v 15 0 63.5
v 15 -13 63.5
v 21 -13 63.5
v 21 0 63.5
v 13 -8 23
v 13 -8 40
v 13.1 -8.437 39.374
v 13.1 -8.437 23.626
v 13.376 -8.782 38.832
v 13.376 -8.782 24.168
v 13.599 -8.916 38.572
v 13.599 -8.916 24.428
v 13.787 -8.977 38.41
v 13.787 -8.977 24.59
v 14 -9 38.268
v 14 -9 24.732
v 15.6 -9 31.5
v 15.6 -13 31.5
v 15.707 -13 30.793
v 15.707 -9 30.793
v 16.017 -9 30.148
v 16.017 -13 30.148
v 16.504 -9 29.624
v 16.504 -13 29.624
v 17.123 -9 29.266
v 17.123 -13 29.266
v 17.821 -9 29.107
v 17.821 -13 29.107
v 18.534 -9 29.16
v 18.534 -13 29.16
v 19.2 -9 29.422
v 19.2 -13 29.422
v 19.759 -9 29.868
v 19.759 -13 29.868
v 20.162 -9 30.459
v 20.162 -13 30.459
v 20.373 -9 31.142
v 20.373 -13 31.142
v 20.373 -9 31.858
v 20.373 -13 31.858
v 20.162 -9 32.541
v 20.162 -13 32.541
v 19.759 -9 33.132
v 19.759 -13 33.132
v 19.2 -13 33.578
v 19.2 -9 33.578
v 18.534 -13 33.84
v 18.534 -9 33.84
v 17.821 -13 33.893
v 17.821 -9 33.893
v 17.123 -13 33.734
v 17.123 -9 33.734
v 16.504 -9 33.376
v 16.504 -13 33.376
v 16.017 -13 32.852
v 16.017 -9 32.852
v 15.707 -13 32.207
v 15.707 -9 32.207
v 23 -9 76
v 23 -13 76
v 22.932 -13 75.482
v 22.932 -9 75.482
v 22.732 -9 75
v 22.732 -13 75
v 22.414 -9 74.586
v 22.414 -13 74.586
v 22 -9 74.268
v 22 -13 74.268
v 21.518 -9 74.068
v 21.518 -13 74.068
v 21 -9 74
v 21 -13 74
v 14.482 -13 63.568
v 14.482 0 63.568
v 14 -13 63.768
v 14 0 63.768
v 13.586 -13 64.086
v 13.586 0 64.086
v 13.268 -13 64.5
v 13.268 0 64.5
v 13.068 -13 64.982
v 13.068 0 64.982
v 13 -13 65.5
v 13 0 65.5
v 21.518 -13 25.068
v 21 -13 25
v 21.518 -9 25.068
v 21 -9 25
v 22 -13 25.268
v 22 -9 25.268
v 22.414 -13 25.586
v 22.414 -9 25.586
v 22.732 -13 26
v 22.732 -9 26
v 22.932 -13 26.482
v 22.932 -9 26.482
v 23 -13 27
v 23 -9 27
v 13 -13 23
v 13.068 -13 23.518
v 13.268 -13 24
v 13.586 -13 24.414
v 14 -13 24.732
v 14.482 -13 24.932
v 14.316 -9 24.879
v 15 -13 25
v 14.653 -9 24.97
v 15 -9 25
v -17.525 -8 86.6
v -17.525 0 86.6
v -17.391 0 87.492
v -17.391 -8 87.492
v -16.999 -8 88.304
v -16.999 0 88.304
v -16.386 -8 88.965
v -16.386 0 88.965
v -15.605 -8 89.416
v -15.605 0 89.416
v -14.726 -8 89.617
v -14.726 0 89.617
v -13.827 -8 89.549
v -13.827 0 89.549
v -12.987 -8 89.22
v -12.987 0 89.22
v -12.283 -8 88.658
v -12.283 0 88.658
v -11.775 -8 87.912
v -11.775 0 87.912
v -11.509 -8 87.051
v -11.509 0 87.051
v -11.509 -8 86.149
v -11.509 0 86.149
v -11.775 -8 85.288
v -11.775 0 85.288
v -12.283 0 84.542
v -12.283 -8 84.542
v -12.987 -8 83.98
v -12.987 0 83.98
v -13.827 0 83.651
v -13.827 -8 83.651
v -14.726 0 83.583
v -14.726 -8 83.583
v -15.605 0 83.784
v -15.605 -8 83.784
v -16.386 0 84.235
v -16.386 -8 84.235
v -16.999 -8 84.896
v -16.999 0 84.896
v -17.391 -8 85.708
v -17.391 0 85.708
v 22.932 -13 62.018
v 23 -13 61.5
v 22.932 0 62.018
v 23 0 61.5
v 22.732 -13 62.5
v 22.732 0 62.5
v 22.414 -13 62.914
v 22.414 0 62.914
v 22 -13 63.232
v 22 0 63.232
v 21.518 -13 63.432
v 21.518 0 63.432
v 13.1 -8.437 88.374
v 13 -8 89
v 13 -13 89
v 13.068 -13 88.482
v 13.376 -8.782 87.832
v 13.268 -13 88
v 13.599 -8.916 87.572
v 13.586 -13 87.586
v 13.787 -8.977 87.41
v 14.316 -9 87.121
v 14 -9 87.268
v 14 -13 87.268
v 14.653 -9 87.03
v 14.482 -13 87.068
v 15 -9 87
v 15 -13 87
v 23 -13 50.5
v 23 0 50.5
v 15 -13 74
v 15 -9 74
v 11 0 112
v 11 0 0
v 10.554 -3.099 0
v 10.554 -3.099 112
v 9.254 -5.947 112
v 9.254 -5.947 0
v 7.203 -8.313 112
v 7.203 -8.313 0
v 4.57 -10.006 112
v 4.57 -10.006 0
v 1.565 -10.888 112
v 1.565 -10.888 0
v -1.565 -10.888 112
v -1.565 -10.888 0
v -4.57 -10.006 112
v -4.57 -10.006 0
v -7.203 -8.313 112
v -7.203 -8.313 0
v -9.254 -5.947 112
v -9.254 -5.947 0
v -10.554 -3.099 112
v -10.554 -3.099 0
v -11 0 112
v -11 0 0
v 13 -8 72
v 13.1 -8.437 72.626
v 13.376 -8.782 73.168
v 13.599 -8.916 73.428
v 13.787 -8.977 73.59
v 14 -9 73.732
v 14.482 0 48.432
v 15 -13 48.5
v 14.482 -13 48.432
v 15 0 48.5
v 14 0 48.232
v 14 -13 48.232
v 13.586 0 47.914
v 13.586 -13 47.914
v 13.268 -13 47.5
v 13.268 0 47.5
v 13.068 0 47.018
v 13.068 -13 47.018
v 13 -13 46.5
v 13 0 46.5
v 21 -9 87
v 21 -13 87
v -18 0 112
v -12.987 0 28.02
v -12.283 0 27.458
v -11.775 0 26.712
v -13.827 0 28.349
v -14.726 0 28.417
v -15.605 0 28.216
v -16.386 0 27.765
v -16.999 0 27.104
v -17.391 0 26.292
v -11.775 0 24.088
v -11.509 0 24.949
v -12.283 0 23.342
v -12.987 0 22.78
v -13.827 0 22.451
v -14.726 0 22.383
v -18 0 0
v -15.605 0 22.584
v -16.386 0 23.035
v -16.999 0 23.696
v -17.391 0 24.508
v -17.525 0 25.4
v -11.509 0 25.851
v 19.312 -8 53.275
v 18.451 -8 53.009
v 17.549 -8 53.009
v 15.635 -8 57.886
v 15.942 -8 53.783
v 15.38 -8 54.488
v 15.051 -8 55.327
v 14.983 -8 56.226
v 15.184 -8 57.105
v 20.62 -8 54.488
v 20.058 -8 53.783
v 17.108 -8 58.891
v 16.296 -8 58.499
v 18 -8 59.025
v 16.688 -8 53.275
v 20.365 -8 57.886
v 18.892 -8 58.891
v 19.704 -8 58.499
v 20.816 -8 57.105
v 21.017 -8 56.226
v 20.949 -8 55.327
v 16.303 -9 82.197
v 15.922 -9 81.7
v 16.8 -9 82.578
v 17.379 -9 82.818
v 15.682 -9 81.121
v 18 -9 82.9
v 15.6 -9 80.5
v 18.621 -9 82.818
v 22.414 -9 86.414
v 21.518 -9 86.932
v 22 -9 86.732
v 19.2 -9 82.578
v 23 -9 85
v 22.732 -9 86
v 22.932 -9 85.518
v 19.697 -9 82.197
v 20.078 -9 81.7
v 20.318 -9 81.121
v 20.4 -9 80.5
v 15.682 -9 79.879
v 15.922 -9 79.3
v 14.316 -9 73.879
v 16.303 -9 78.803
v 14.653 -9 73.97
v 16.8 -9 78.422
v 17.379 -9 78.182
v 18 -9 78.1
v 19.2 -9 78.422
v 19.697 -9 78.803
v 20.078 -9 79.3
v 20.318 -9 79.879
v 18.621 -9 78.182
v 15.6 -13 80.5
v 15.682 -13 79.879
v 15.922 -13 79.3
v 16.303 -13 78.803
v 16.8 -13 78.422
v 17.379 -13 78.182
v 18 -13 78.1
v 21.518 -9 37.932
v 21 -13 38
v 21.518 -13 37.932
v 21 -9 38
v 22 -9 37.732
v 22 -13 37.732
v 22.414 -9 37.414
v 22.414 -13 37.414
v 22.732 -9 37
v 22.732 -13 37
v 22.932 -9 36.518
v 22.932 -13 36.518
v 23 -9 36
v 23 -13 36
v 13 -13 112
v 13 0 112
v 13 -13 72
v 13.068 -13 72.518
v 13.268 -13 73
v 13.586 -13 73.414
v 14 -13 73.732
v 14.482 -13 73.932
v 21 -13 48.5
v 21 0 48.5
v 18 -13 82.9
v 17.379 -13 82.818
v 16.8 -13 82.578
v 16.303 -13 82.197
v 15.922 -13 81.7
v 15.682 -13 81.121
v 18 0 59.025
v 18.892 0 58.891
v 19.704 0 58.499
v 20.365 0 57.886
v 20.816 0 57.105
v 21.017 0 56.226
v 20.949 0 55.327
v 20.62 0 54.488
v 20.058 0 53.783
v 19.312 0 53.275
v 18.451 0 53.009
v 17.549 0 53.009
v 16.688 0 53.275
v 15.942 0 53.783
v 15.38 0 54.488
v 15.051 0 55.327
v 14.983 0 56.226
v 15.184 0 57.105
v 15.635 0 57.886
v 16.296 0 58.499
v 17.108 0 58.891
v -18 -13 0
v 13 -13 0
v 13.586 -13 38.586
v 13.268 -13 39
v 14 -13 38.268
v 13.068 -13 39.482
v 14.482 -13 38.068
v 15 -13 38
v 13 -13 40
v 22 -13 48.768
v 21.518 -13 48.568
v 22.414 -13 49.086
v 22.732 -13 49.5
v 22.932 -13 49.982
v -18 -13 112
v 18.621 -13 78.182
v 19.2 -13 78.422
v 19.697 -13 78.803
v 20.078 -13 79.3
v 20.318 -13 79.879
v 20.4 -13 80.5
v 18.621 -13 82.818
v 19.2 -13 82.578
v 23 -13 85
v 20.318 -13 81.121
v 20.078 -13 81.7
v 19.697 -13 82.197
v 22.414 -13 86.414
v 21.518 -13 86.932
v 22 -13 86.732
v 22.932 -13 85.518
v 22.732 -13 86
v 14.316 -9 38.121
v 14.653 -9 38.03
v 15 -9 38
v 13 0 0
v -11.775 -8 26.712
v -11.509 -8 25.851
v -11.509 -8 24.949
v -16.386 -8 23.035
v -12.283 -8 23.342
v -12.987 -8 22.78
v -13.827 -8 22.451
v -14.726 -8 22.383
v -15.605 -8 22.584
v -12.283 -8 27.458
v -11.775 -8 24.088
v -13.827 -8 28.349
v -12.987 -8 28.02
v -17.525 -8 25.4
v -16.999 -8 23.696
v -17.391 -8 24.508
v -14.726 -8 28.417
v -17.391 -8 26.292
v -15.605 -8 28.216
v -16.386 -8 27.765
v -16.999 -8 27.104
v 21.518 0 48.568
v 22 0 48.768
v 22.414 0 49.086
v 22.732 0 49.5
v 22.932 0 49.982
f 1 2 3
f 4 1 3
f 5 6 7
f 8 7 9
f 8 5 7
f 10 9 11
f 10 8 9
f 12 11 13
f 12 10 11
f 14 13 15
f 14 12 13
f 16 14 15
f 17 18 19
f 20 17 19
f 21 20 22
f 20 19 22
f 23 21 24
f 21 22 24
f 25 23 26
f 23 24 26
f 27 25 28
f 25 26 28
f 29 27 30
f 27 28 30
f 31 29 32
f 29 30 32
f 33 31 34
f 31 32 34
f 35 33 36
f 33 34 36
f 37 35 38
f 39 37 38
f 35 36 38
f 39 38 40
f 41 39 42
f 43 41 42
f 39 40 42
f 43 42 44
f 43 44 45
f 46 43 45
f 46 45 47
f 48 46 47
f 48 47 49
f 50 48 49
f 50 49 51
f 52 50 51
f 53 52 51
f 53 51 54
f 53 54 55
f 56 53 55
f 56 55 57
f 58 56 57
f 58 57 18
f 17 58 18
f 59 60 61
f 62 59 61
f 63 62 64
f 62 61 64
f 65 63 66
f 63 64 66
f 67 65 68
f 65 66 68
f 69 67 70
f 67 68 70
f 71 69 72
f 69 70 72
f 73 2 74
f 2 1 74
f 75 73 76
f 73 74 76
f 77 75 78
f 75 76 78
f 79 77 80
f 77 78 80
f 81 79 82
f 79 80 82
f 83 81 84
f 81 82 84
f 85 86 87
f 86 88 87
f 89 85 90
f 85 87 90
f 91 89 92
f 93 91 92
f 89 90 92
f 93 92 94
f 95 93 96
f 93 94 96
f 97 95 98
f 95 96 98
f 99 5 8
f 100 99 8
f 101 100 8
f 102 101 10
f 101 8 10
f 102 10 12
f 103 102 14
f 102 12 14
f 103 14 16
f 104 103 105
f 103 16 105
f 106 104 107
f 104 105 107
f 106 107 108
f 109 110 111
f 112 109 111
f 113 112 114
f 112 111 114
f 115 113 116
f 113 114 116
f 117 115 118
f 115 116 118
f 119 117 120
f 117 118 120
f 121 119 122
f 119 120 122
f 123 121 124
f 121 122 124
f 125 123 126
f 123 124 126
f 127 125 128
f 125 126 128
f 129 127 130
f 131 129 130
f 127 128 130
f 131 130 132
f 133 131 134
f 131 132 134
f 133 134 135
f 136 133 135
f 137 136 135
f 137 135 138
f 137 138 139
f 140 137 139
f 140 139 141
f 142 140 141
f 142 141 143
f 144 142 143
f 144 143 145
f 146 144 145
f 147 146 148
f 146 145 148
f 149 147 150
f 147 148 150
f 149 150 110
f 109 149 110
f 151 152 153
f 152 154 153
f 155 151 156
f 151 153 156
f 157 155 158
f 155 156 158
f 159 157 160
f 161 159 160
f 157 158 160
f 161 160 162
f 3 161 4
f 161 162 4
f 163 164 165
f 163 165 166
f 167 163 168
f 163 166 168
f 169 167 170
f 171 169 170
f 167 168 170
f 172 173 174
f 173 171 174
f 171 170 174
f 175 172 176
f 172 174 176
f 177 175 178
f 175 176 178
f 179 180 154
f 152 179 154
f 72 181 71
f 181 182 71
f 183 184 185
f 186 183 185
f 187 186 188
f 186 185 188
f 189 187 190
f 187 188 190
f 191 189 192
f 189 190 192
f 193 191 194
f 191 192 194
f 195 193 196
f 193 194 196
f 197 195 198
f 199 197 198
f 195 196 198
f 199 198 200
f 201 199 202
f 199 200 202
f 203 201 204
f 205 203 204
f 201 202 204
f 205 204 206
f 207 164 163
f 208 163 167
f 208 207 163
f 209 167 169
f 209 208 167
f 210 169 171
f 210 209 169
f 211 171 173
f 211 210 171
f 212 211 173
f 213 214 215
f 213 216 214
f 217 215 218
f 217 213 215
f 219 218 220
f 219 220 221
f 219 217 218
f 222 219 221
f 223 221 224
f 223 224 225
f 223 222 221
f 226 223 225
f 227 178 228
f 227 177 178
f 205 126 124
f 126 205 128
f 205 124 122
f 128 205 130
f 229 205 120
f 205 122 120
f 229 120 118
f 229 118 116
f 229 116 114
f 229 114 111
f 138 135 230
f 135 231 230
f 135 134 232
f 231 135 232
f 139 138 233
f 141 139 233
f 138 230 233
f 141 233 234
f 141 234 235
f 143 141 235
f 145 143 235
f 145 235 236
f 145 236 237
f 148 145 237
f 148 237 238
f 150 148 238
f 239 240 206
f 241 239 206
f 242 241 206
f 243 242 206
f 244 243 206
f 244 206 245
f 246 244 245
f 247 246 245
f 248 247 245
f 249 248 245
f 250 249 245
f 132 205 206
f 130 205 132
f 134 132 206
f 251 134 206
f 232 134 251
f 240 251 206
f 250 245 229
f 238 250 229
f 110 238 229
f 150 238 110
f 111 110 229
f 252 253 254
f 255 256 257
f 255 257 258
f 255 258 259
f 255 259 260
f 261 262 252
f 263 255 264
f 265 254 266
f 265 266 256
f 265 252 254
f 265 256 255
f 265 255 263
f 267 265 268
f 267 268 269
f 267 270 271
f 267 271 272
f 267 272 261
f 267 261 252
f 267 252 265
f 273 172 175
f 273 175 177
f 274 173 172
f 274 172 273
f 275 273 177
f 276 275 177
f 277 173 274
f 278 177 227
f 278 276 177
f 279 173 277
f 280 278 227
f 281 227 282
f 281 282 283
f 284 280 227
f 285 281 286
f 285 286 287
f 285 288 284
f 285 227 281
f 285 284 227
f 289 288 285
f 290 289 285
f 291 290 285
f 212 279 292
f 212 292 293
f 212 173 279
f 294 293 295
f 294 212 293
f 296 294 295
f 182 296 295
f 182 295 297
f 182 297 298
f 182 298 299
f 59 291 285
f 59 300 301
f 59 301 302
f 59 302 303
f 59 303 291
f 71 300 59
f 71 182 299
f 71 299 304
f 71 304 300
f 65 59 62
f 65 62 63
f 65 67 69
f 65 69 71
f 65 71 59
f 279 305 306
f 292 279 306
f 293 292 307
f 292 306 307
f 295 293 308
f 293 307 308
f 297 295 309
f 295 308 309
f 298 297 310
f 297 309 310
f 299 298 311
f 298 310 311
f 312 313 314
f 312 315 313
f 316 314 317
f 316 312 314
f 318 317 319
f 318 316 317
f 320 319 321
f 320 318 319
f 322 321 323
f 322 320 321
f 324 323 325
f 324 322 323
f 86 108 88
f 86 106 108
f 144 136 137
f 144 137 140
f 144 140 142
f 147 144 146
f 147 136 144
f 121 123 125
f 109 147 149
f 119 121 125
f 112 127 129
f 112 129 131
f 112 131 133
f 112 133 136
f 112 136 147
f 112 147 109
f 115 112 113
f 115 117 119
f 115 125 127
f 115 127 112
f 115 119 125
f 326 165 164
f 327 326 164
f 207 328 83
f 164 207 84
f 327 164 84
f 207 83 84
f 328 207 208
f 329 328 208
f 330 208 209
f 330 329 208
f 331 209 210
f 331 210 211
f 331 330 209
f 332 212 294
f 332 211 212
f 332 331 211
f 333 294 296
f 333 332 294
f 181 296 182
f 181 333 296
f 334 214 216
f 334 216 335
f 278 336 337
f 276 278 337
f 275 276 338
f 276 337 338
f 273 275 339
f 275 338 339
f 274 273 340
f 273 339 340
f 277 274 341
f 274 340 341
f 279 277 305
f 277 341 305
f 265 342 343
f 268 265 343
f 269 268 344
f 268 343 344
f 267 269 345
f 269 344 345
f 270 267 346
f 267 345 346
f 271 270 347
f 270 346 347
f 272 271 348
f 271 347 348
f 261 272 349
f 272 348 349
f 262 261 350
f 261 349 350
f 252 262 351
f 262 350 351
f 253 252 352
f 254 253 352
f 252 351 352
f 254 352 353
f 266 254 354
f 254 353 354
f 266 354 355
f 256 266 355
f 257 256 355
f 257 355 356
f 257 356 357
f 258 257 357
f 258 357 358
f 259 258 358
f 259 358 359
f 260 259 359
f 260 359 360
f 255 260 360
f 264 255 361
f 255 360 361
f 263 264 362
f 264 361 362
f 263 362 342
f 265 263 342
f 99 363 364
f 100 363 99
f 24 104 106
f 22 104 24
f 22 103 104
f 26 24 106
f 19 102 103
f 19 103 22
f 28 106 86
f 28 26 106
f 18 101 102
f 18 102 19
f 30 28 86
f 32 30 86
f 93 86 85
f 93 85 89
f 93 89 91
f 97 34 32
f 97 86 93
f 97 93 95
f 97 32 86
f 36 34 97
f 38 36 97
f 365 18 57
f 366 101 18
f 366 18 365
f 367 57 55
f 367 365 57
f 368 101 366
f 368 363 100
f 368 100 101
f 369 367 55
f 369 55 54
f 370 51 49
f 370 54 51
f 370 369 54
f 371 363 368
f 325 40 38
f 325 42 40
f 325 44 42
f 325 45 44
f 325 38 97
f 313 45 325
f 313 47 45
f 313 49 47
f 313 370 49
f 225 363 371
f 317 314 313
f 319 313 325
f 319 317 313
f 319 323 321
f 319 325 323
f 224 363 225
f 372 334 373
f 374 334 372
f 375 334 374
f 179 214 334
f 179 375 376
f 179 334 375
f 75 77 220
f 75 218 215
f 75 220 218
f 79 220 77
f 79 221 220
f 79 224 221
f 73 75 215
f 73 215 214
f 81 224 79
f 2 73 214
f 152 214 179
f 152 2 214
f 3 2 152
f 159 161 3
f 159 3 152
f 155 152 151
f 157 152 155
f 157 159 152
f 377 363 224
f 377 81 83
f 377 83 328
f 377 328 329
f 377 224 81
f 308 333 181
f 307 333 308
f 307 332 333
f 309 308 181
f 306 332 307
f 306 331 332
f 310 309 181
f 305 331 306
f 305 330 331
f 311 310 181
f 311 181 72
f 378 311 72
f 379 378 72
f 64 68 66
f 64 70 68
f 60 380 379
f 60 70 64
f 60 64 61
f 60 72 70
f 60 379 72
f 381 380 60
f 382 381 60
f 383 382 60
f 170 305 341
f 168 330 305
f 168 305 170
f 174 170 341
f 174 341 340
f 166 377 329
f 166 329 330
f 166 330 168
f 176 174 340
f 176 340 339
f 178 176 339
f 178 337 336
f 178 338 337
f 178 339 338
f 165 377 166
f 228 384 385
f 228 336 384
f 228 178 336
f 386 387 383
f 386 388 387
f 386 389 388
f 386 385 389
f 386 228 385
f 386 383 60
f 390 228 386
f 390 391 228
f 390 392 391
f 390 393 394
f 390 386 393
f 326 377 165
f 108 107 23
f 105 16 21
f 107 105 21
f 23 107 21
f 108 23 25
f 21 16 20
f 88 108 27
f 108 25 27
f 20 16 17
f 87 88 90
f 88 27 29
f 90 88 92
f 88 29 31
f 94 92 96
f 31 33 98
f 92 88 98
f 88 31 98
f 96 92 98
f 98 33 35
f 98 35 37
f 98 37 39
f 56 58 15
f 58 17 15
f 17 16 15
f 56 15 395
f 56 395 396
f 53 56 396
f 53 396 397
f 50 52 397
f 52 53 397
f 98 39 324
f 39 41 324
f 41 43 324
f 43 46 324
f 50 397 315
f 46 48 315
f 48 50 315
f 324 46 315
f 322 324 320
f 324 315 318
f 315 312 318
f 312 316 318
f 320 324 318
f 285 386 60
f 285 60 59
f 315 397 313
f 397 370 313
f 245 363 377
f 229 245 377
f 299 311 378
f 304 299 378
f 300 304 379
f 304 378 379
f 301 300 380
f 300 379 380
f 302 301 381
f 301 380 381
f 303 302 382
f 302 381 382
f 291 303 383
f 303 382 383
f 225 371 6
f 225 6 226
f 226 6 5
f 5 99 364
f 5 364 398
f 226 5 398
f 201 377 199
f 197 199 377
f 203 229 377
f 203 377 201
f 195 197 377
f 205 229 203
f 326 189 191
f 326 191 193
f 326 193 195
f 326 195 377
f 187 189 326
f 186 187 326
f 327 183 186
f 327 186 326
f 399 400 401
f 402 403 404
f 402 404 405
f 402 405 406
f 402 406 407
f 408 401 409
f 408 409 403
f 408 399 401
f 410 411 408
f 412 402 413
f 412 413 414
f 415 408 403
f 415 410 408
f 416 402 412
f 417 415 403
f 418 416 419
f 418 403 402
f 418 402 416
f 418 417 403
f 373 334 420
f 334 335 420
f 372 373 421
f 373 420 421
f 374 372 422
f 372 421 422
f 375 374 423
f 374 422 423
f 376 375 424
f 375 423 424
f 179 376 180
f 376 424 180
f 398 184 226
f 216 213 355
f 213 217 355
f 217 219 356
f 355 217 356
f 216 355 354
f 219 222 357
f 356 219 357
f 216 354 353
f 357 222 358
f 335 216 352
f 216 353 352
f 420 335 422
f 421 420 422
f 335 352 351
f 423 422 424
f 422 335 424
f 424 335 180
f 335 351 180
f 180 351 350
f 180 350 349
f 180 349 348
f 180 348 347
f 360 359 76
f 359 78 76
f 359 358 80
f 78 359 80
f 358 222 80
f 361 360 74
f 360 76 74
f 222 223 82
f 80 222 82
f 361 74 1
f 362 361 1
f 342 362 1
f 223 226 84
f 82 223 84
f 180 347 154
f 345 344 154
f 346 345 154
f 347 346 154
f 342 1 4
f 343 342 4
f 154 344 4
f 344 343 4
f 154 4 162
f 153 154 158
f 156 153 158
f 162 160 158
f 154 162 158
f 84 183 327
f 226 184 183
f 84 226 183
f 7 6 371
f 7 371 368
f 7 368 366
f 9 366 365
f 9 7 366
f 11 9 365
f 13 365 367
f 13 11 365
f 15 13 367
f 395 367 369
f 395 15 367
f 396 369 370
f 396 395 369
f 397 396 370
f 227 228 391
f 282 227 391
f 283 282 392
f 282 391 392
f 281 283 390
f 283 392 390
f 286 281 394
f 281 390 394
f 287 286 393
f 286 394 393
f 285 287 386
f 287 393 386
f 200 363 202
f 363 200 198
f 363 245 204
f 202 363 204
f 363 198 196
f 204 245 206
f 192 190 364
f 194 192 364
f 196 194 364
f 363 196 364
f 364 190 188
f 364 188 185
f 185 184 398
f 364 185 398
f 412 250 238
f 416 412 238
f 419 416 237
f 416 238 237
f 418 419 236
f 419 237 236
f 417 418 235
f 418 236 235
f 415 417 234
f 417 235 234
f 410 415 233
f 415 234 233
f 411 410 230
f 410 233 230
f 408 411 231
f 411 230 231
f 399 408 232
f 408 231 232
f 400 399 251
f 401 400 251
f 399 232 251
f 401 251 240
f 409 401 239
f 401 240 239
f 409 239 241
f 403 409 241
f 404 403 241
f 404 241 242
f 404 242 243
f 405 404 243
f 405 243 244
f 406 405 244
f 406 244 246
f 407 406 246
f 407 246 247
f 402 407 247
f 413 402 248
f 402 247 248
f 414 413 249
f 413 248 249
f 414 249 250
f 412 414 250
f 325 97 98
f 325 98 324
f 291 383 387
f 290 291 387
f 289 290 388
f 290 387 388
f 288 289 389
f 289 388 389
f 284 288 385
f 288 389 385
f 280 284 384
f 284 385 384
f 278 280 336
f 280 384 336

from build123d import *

# Parameters (mm, degrees)
BOSS_EXTRUDE1_DEPTH  = 112
SKETCH2_R            = 3.025
CUT_EXTRUDE1_DEPTH   = 8
SKETCH3_W            = 11
SKETCH3_H            = 11
BOSS_EXTRUDE2_DEPTH  = 4
BOSS_EXTRUDE3_REACH  = 126.988
SKETCH8_W            = 10
SKETCH8_H            = 13
BOSS_EXTRUDE4_DEPTH  = 4
FILLET1_R            = 2
M4_CLEARANCE_HOLE1_D = 4.8
MIRROR1_START        = 12.831076745
MIRROR1_OUTLINE_W    = 4
MIRROR1_OUTLINE_H    = 13
MIRROR1_DEPTH        = 2.768923155
MIRROR1_START_2      = 20.4000001
MIRROR1_2_OUTLINE_W  = 4
MIRROR1_2_OUTLINE_H  = 13
MIRROR1_2_DEPTH      = 0.5999999
MIRROR1_START_3      = 74
MIRROR1_3_DEPTH      = 13
MIRROR1_4_OUTLINE_W  = 4.8000002
MIRROR1_4_OUTLINE_H  = 4
MIRROR1_4_DEPTH      = 4.0999999
MIRROR1_START_4      = 82.9000001
MIRROR1_5_OUTLINE_W  = 4.8000002
MIRROR1_5_OUTLINE_H  = 4
MIRROR1_5_DEPTH      = 4.0999999
MIRROR1_START_5      = 76
MIRROR1_6_OUTLINE_W  = 2
MIRROR1_6_OUTLINE_H  = 4
MIRROR1_6_DEPTH      = 9
MIRROR1_START_6      = -13
MIRROR1_7_DEPTH      = 4
CUT_EXTRUDE2_DEPTH   = 126.455171276
BOSS_EXTRUDE5_START  = -87
BOSS_EXTRUDE5_DEPTH  = 112
SKETCH15_W           = 10
SKETCH15_H           = 15
SKETCH15_R           = 3.025
BOSS_EXTRUDE6_DEPTH  = 13
SKETCH16_R           = 3.025
CUT_EXTRUDE3_DEPTH   = 8
FILLET2_R            = 2
FILLET3_R            = 1


with BuildPart() as part:
    # Sketch1 → Boss-Extrude1 (new body)
    with BuildSketch(Plane.XY):
        with BuildLine():
            ThreePointArc((0, -13), (-9.192388155, -9.192388155), (-13, 0))
            Line((-13, 0), (-18, 0))
            Line((-18, 0), (-18, -13))
            Line((-18, -13), (0, -13))
        make_face()
        with BuildLine():
            Line((-11, 0), (-13, 0))
            ThreePointArc((-13, 0), (-9.192388155, -9.192388155), (0, -13))
            ThreePointArc((0, -13), (9.192388155, -9.192388155), (13, 0))
            Line((13, 0), (11, 0))
            ThreePointArc((11, 0), (0, -11), (-11, 0))
        make_face()
    extrude(amount=BOSS_EXTRUDE1_DEPTH)

    # Sketch2 → Cut-Extrude1 (cut)
    with BuildSketch(Plane(origin=(0, 0, 0), x_dir=(1, 0, 0), z_dir=(0, 1, 0))):
        with Locations(Location((-14.5, -25.4, 0), (0, 0, 180))):
            Circle(SKETCH2_R)
        with Locations(Location((-14.5, -86.6, 0), (0, 0, 180))):
            Circle(SKETCH2_R)
    extrude(amount=-CUT_EXTRUDE1_DEPTH, mode=Mode.SUBTRACT)

    # Sketch3 → Boss-Extrude2 (add)
    with BuildSketch(Plane.XZ.offset(13)):
        with Locations((-12.5, 117.5)):
            Rectangle(SKETCH3_W, SKETCH3_H)
    extrude(amount=-BOSS_EXTRUDE2_DEPTH)

    # Sketch7 → Boss-Extrude3 (add, up to next)
    with BuildSketch(Plane.XZ.offset(13), mode=Mode.PRIVATE) as boss_extrude3_sk1:
        Polygon((0, 25), (13, 25), (13, 31.5), (13, 38), (0, 38), align=None)
    boss_extrude3_tool1 = extrude(boss_extrude3_sk1.sketch, amount=-BOSS_EXTRUDE3_REACH, mode=Mode.PRIVATE) - part.part
    add(boss_extrude3_tool1.solids().sort_by_distance((6.5, -13, 31.5))[0])

    # Sketch8 → Boss-Extrude4 (add)
    with BuildSketch(Plane.XZ.offset(13)):
        with Locations((18, 31.5)):
            Rectangle(SKETCH8_W, SKETCH8_H)
    extrude(amount=-BOSS_EXTRUDE4_DEPTH)

    # Fillet1
    fillet1_edges = [part.edges().sort_by_distance(p)[0] for p in [
        (-18, -11, 123),
        (-7, -11, 123),
        (23, -11, 38),
        (23, -11, 25),
    ]]
    fillet(fillet1_edges, radius=FILLET1_R)

    # M4 Clearance Hole1 (through all)
    with Locations(Plane(origin=(0, -9, 0), x_dir=(1, 0, 0), z_dir=(0, 1, 0))):
        with Locations((-12.5, -117.5), (18, -31.5)):
            Hole(M4_CLEARANCE_HOLE1_D / 2)



with BuildPart() as body_2:
    # Mirror1: read off the stored shape, not the designer's step
    # Mirror1 outline → Mirror1 (new body)
    with BuildSketch(Plane.YZ.offset(MIRROR1_START)):
        with Locations((-11, 80.5)):
            Rectangle(MIRROR1_OUTLINE_W, MIRROR1_OUTLINE_H)
    extrude(amount=MIRROR1_DEPTH)


with BuildPart() as body_3:
    # Mirror1 2 outline → Mirror1 2 (new body)
    with BuildSketch(Plane.YZ.offset(MIRROR1_START_2)):
        with Locations((-11, 80.5)):
            Rectangle(MIRROR1_2_OUTLINE_W, MIRROR1_2_OUTLINE_H)
    extrude(amount=MIRROR1_2_DEPTH)


with BuildPart() as part_1:
    add(part.part)

    add(body_2.part)  # Mirror1 3 merges body 2
    # Mirror1 3 outline → Mirror1 3 (add)
    with BuildSketch(Plane.XY.offset(MIRROR1_START_3)):
        with BuildLine():
            Line((15.5999999, -9), (13, -9))
            Line((13, -9), (13, 0))
            ThreePointArc((13, 0), (9.192388155, -9.192388155), (0, -13))
            Line((0, -13), (12.831076745, -13))
            Line((12.831076745, -13), (15.5999999, -13))
            Line((15.5999999, -13), (15.5999999, -9))
        make_face()
    extrude(amount=MIRROR1_3_DEPTH)


    add(body_3.part)  # Mirror1 4 merges body 3
    # Mirror1 4 outline → Mirror1 4 (add)
    with BuildSketch(Plane.XY.offset(MIRROR1_START_3)):
        with Locations((18, -11)):
            Rectangle(MIRROR1_4_OUTLINE_W, MIRROR1_4_OUTLINE_H)
    extrude(amount=MIRROR1_4_DEPTH)

    # Mirror1 5 outline → Mirror1 5 (add)
    with BuildSketch(Plane.XY.offset(MIRROR1_START_4)):
        with Locations((18, -11)):
            Rectangle(MIRROR1_5_OUTLINE_W, MIRROR1_5_OUTLINE_H)
    extrude(amount=MIRROR1_5_DEPTH)

    # Mirror1 6 outline → Mirror1 6 (add)
    with BuildSketch(Plane.XY.offset(MIRROR1_START_5)):
        with Locations((22, -11)):
            Rectangle(MIRROR1_6_OUTLINE_W, MIRROR1_6_OUTLINE_H)
    extrude(amount=MIRROR1_6_DEPTH)

    # Mirror1 7 outline → Mirror1 7 (add)
    with BuildSketch(Plane(origin=(0, 0, 0), x_dir=(1, 0, 0), z_dir=(0, 1, 0)).offset(MIRROR1_START_6)):
        with BuildLine():
            ThreePointArc((23, -76), (22.414213562, -74.585786438), (21, -74))
            Line((21, -74), (21, -76))
            Line((21, -76), (23, -76))
        make_face()
        with BuildLine():
            Line((21, -85), (21, -87))
            ThreePointArc((21, -87), (22.414213562, -86.414213562), (23, -85))
            Line((23, -85), (21, -85))
        make_face()
        with BuildLine():
            Line((20.4000001, -82.9000001), (20.4, -80.5))
            ThreePointArc((20.4, -80.5), (19.697056275, -82.197056275), (18, -82.9))
            Line((18, -82.9), (20.4000001, -82.9000001))
        make_face()
        with BuildLine():
            ThreePointArc((18, -78.1), (19.697056275, -78.802943725), (20.4, -80.5))
            Line((20.4, -80.5), (20.4000001, -78.0999999))
            Line((20.4000001, -78.0999999), (18, -78.1))
        make_face()
        with BuildLine():
            ThreePointArc((15.6, -80.5), (16.302943725, -78.802943725), (18, -78.1))
            Line((18, -78.1), (15.5999999, -78.0999999))
            Line((15.5999999, -78.0999999), (15.6, -80.5))
        make_face()
        with BuildLine():
            Line((15.5999999, -82.9000001), (18, -82.9))
            ThreePointArc((18, -82.9), (16.302943725, -82.197056275), (15.6, -80.5))
            Line((15.6, -80.5), (15.5999999, -82.9000001))
        make_face()
    extrude(amount=MIRROR1_7_DEPTH)

    # Sketch12 → Cut-Extrude2 (cut, through all)
    with BuildSketch(Plane(origin=(0, -9, 0), x_dir=(1, 0, 0), z_dir=(0, 1, 0))):
        with BuildLine():
            Line((-18, -112), (-18, -121))
            ThreePointArc((-18, -121), (-17.414213562, -122.414213562), (-16, -123))
            Line((-16, -123), (-9, -123))
            ThreePointArc((-9, -123), (-7.585786438, -122.414213562), (-7, -121))
            Line((-7, -121), (-7, -112))
            Line((-7, -112), (-18, -112))
        make_face()
    extrude(amount=-CUT_EXTRUDE2_DEPTH, mode=Mode.SUBTRACT)

    # Sketch13 → Boss-Extrude5 (add)
    with BuildSketch(Plane.XY.offset(87).offset(BOSS_EXTRUDE5_START)):
        with BuildLine():
            Line((13, -13), (13, -9))
            Line((13, -9), (13, 0))
            ThreePointArc((13, 0), (9.192388155, -9.192388155), (0, -13))
            Line((0, -13), (13, -13))
        make_face()
    extrude(amount=BOSS_EXTRUDE5_DEPTH)

    # Sketch15 → Boss-Extrude6 (add)
    # profile 1 of 2: a face of its own
    with BuildSketch(Plane.XZ.offset(13)):
        with Locations((18, 56)):
            Rectangle(SKETCH15_W, SKETCH15_H)
        with Locations((18, 56)):
            Circle(SKETCH15_R, mode=Mode.SUBTRACT)
    # profile 2 of 2: a face of its own
    with BuildSketch(Plane.XZ.offset(13)):
        with Locations((18, 56)):
            Circle(SKETCH15_R)
    extrude(amount=-BOSS_EXTRUDE6_DEPTH)

    # Sketch16 → Cut-Extrude3 (cut)
    with BuildSketch(Plane(origin=(0, 0, 0), x_dir=(1, 0, 0), z_dir=(0, 1, 0))):
        with Locations(Location((18, -56, 0), (0, 0, 270))):
            Circle(SKETCH16_R)
    extrude(amount=-CUT_EXTRUDE3_DEPTH, mode=Mode.SUBTRACT)

    # Fillet2
    fillet2_edges = [part_1.edges().sort_by_distance(p)[0] for p in [
        (13, -11, 25),
        (13, -11, 38),
        (13, -11, 74),
        (13, -11, 87),
        (23, -6.5, 63.5),
        (23, -6.5, 48.5),
        (13, -6.5, 48.5),
        (13, -6.5, 63.5),
    ]]
    fillet(fillet2_edges, radius=FILLET2_R)

    # Fillet3
    fillet3_edges = [part_1.edges().sort_by_distance(p)[0] for p in [
        (13, -9, 80.5),
        (13, -9, 31.5),
    ]]
    fillet(fillet3_edges, radius=FILLET3_R)


solid = part_1.part
